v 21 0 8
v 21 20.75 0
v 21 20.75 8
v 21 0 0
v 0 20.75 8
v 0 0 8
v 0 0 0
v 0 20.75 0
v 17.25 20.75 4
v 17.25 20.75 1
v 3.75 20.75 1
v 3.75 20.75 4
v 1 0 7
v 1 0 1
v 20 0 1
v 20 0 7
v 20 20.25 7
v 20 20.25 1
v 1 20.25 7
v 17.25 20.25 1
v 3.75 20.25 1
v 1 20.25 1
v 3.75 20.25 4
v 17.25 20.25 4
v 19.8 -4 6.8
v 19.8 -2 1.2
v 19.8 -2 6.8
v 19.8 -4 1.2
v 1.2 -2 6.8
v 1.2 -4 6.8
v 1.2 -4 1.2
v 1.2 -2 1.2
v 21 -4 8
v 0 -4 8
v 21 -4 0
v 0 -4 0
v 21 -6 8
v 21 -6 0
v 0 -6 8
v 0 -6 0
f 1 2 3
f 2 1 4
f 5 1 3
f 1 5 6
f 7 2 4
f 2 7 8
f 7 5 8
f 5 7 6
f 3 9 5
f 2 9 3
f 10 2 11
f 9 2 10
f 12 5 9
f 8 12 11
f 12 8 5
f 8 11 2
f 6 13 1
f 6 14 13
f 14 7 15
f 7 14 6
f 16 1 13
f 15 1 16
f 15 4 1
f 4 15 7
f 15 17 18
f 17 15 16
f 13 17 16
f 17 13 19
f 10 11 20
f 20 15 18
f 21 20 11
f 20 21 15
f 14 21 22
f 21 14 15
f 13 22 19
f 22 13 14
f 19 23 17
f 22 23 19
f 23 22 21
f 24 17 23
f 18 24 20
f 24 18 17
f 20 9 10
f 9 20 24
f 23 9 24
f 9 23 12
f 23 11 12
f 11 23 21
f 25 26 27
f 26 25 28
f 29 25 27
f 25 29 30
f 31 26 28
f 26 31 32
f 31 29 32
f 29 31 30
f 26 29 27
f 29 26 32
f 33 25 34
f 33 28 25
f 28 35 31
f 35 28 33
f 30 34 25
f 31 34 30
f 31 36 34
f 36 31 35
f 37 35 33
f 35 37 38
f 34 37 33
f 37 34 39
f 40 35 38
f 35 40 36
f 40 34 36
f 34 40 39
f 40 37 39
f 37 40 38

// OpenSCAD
a = 8;//höhe
b = 21;//breite

difference(){
    cube([b, 20.75, a], false);
    translate([1, -1, 1]){
        cube([b-2, 21.25, a-2], false);
    }
    translate([3.75, 0.25, 1]){
        cube([13.5, 22.5, 3], false);
    }
}



//lid
translate([1.2, -4, 1.2]){
    cube([b-2.4, 2, a-2.4], false);
}
translate([0, -6, 0]){
    cube([b, 2, a], false);
}


echo("\n\n\t\tThis is a design for a case for the Digispark\n");
